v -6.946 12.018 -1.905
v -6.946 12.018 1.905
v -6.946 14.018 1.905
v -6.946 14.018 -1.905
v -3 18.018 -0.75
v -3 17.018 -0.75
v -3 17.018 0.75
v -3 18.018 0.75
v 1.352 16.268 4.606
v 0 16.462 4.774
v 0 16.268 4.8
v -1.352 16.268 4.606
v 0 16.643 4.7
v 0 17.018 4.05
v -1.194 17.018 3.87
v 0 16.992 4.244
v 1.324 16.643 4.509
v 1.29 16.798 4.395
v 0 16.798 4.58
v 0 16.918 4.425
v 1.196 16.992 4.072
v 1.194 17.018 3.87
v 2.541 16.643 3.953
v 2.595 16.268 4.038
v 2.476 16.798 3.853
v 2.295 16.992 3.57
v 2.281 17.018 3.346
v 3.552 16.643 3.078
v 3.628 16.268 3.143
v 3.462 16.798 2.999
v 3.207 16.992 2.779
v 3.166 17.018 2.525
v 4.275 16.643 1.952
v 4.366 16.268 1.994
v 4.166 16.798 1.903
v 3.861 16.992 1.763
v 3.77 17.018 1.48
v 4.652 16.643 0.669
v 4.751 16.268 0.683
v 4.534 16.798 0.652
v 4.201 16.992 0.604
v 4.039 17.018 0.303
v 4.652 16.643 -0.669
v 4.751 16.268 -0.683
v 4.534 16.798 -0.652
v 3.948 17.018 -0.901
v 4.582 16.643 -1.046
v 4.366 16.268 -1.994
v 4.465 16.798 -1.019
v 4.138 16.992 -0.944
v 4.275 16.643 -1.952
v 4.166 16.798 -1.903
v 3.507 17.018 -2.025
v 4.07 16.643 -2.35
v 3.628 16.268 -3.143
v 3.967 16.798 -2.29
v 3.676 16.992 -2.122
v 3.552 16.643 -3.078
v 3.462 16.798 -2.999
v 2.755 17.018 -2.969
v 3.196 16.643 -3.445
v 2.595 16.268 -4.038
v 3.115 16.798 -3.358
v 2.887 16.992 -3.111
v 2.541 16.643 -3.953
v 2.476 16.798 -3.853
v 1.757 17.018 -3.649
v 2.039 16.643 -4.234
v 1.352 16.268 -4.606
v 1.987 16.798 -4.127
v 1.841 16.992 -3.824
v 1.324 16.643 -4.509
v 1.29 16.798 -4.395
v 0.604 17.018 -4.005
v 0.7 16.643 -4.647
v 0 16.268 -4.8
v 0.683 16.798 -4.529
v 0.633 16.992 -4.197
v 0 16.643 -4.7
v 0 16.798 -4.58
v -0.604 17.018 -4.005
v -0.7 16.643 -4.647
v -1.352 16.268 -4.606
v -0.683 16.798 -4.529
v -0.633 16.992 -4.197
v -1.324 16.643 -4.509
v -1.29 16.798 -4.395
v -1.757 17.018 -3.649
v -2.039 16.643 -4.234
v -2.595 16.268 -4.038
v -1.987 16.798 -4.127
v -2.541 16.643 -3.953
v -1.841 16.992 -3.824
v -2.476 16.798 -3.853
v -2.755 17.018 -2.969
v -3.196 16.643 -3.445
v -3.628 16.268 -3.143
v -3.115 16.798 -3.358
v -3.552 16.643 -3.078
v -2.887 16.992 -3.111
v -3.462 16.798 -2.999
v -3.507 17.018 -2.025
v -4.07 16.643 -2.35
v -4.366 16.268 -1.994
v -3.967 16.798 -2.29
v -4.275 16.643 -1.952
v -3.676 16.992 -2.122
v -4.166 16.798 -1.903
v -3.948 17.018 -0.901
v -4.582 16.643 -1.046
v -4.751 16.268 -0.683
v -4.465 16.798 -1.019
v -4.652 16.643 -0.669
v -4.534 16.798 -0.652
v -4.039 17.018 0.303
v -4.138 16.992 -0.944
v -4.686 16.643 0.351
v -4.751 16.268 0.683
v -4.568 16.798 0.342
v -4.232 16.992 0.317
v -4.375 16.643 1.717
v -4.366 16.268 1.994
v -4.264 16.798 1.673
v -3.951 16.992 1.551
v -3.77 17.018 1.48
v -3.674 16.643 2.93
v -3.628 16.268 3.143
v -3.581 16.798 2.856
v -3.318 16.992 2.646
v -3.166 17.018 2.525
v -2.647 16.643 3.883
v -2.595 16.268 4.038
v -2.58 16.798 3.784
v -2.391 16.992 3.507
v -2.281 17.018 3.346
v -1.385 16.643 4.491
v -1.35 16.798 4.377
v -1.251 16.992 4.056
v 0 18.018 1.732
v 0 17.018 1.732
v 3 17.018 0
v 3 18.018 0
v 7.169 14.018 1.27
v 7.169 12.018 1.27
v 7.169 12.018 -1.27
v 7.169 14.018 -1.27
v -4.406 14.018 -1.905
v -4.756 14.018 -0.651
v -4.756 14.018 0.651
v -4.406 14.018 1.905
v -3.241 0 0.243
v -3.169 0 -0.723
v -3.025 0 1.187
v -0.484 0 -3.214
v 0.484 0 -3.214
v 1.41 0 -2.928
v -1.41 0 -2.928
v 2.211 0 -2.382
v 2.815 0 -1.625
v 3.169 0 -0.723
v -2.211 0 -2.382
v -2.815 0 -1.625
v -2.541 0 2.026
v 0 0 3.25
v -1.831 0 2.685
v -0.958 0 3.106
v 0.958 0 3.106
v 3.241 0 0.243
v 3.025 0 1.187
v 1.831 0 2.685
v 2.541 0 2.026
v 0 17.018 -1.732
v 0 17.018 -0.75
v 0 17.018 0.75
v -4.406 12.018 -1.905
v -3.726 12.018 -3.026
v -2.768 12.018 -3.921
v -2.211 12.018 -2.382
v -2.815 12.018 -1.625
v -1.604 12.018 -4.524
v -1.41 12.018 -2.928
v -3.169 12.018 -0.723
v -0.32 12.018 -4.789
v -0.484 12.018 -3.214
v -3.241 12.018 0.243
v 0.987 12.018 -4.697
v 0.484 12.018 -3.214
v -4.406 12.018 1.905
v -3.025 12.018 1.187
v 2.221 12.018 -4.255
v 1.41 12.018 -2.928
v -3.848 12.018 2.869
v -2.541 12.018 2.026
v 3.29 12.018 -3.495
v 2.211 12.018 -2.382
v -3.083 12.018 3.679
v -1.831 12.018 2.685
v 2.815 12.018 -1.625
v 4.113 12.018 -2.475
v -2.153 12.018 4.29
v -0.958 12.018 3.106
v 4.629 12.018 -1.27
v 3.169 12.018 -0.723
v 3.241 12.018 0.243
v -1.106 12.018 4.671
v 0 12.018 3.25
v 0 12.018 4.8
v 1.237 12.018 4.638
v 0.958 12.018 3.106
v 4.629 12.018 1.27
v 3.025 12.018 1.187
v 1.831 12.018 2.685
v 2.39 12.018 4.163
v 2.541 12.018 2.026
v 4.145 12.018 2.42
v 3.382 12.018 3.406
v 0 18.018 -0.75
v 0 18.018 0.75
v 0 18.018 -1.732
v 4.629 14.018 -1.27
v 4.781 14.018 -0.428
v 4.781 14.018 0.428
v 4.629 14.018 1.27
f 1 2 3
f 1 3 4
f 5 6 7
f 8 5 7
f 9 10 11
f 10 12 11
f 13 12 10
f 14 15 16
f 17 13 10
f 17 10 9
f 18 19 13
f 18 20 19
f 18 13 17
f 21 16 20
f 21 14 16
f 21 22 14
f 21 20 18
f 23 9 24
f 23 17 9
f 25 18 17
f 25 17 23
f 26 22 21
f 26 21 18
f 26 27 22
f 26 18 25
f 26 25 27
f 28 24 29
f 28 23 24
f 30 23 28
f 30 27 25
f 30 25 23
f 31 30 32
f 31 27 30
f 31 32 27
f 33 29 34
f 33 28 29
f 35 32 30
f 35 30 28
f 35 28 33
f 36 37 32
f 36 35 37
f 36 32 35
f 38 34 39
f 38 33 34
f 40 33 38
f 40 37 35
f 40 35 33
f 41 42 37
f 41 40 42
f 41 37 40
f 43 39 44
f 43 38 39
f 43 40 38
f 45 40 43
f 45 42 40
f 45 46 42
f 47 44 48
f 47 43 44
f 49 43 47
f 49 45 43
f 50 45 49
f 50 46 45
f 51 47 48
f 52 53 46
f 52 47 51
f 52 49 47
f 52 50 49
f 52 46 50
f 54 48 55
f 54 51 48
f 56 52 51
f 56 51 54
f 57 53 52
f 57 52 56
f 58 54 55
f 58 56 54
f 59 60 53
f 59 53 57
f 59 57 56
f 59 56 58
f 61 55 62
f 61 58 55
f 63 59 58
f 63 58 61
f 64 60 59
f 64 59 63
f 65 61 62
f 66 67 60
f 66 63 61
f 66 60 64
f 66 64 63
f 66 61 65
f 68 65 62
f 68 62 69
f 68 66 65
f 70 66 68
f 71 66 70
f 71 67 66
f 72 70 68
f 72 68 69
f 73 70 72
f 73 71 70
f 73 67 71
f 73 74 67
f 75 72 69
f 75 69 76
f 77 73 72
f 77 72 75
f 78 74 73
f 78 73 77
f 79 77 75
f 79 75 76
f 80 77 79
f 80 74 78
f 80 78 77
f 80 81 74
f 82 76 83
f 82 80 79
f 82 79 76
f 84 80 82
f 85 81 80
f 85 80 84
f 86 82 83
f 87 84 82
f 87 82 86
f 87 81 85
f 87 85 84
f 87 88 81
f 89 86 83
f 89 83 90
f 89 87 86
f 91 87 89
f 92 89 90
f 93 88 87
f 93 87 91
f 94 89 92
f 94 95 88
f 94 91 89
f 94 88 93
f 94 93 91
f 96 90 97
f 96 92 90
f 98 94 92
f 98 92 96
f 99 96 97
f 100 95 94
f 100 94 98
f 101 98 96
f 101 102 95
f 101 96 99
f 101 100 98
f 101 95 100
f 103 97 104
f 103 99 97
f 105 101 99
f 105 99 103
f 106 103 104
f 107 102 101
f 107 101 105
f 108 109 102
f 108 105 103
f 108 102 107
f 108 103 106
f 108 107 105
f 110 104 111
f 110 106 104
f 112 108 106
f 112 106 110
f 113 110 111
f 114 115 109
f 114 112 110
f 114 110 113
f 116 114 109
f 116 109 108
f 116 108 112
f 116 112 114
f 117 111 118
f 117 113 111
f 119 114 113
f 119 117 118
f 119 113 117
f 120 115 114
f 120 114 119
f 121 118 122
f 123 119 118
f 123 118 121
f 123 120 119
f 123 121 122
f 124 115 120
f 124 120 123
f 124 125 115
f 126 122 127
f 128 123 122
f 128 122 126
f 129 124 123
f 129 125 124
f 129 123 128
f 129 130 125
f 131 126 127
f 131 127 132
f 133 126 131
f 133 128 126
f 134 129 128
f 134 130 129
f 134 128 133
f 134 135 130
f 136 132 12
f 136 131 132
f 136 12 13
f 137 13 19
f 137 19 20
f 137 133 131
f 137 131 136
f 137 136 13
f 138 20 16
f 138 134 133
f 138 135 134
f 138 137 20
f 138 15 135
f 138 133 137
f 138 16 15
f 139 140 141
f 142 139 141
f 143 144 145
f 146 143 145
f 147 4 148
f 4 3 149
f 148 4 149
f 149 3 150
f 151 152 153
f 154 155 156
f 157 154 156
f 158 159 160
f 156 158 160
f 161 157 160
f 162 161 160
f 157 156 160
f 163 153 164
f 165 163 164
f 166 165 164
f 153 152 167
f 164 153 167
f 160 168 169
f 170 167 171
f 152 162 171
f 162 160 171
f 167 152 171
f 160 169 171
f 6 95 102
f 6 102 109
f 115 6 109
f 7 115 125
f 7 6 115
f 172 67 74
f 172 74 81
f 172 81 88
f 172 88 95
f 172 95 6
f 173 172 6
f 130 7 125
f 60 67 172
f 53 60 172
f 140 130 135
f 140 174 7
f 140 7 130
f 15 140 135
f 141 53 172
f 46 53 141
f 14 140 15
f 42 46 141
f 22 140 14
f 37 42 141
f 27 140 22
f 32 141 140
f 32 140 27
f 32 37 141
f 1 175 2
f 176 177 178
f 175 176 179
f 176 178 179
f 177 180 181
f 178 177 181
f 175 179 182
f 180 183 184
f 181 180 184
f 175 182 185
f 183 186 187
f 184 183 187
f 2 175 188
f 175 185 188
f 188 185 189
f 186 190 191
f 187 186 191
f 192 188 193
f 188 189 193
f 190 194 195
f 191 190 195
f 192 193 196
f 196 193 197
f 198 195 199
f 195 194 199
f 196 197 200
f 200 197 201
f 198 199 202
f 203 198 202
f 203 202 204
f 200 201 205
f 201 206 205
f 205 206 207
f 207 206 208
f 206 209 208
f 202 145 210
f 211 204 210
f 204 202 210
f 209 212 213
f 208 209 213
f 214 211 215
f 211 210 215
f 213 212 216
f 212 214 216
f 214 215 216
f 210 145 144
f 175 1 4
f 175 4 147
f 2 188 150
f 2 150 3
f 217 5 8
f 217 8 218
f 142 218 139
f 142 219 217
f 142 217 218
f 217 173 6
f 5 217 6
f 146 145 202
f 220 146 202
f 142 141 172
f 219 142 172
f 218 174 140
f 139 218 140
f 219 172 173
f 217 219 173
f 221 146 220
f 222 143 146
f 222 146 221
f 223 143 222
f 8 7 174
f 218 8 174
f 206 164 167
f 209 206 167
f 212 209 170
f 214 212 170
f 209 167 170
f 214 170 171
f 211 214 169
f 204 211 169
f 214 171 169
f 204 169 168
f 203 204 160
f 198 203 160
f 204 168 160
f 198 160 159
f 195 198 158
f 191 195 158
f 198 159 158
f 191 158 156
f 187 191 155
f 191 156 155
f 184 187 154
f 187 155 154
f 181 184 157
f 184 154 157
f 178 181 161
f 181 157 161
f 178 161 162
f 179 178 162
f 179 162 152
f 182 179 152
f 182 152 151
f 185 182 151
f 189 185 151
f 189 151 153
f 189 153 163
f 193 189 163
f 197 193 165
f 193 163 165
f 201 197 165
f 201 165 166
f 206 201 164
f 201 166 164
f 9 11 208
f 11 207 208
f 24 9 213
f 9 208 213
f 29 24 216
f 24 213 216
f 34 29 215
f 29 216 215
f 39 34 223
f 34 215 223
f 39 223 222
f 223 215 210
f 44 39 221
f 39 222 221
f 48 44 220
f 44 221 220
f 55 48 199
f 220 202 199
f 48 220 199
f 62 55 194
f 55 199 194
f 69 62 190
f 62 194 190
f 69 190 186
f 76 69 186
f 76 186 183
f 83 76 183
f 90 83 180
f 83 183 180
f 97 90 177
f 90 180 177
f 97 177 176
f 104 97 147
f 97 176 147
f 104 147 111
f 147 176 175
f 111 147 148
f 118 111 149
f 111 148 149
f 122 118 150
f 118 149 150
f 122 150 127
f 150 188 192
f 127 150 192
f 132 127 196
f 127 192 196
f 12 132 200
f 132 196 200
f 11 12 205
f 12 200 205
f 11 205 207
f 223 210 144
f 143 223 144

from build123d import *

# Parameters (mm, degrees)
SKETCH1_R           = 3.25
BOSS_EXTRUDE1_DEPTH = 12.018
SKETCH6_R           = 4.8
BOSS_EXTRUDE2_DEPTH = 5
FILLET1_R           = 0.75
BOSS_EXTRUDE3_DEPTH = 1
BOSS_EXTRUDE4_DEPTH = 2


with BuildPart() as part:
    # Sketch1 → Boss-Extrude1 (new body)
    with BuildSketch(Plane(origin=(0, 0, 0), x_dir=(1, 0, 0), z_dir=(0, 1, 0))):
        with Locations(Location((0, 0, 0), (0, 0, 270))):
            Circle(SKETCH1_R)
    extrude(amount=BOSS_EXTRUDE1_DEPTH)

    # Sketch6 → Boss-Extrude2 (add)
    with BuildSketch(Plane(origin=(0, 12.018, 0), x_dir=(1, 0, 0), z_dir=(0, 1, 0))):
        with Locations(Location((0, 0, 0), (0, 0, 270))):
            Circle(SKETCH6_R)
    extrude(amount=BOSS_EXTRUDE2_DEPTH)

    # Fillet1
    fillet1_edges = [part.edges().sort_by_distance(p)[0] for p in [
        (0, 17.018, -4.8),
    ]]
    fillet(fillet1_edges, radius=FILLET1_R)

    # Sketch8 → Boss-Extrude3 (add)
    with BuildSketch(Plane(origin=(0, 17.018, 0), x_dir=(1, 0, 0), z_dir=(0, 1, 0))):
        Polygon((0, 0.75), (-3, 0.75), (-3, -0.75), (0, -0.75), (0, -1.732050808), (3, 0), (0, 1.732050808), align=None)
    extrude(amount=BOSS_EXTRUDE3_DEPTH)

    # Sketch9 → Boss-Extrude4 (add)
    with BuildSketch(Plane.XZ.offset(-12.018)):
        with BuildLine():
            Line((-4.405788806, 1.905), (-6.945788806, 1.905))
            Line((-6.945788806, 1.905), (-6.945788806, -1.905))
            Line((-6.945788806, -1.905), (-4.405788806, -1.905))
            ThreePointArc((-4.405788806, -1.905), (-4.8, 0), (-4.405788806, 1.905))
        make_face()
        with BuildLine():
            Line((4.628941564, 1.27), (7.168941564, 1.27))
            Line((7.168941564, 1.27), (7.168941564, -1.27))
            Line((7.168941564, -1.27), (4.628941564, -1.27))
            ThreePointArc((4.628941564, -1.27), (4.8, 0), (4.628941564, 1.27))
        make_face()
    extrude(amount=-BOSS_EXTRUDE4_DEPTH)


solid = part.part
